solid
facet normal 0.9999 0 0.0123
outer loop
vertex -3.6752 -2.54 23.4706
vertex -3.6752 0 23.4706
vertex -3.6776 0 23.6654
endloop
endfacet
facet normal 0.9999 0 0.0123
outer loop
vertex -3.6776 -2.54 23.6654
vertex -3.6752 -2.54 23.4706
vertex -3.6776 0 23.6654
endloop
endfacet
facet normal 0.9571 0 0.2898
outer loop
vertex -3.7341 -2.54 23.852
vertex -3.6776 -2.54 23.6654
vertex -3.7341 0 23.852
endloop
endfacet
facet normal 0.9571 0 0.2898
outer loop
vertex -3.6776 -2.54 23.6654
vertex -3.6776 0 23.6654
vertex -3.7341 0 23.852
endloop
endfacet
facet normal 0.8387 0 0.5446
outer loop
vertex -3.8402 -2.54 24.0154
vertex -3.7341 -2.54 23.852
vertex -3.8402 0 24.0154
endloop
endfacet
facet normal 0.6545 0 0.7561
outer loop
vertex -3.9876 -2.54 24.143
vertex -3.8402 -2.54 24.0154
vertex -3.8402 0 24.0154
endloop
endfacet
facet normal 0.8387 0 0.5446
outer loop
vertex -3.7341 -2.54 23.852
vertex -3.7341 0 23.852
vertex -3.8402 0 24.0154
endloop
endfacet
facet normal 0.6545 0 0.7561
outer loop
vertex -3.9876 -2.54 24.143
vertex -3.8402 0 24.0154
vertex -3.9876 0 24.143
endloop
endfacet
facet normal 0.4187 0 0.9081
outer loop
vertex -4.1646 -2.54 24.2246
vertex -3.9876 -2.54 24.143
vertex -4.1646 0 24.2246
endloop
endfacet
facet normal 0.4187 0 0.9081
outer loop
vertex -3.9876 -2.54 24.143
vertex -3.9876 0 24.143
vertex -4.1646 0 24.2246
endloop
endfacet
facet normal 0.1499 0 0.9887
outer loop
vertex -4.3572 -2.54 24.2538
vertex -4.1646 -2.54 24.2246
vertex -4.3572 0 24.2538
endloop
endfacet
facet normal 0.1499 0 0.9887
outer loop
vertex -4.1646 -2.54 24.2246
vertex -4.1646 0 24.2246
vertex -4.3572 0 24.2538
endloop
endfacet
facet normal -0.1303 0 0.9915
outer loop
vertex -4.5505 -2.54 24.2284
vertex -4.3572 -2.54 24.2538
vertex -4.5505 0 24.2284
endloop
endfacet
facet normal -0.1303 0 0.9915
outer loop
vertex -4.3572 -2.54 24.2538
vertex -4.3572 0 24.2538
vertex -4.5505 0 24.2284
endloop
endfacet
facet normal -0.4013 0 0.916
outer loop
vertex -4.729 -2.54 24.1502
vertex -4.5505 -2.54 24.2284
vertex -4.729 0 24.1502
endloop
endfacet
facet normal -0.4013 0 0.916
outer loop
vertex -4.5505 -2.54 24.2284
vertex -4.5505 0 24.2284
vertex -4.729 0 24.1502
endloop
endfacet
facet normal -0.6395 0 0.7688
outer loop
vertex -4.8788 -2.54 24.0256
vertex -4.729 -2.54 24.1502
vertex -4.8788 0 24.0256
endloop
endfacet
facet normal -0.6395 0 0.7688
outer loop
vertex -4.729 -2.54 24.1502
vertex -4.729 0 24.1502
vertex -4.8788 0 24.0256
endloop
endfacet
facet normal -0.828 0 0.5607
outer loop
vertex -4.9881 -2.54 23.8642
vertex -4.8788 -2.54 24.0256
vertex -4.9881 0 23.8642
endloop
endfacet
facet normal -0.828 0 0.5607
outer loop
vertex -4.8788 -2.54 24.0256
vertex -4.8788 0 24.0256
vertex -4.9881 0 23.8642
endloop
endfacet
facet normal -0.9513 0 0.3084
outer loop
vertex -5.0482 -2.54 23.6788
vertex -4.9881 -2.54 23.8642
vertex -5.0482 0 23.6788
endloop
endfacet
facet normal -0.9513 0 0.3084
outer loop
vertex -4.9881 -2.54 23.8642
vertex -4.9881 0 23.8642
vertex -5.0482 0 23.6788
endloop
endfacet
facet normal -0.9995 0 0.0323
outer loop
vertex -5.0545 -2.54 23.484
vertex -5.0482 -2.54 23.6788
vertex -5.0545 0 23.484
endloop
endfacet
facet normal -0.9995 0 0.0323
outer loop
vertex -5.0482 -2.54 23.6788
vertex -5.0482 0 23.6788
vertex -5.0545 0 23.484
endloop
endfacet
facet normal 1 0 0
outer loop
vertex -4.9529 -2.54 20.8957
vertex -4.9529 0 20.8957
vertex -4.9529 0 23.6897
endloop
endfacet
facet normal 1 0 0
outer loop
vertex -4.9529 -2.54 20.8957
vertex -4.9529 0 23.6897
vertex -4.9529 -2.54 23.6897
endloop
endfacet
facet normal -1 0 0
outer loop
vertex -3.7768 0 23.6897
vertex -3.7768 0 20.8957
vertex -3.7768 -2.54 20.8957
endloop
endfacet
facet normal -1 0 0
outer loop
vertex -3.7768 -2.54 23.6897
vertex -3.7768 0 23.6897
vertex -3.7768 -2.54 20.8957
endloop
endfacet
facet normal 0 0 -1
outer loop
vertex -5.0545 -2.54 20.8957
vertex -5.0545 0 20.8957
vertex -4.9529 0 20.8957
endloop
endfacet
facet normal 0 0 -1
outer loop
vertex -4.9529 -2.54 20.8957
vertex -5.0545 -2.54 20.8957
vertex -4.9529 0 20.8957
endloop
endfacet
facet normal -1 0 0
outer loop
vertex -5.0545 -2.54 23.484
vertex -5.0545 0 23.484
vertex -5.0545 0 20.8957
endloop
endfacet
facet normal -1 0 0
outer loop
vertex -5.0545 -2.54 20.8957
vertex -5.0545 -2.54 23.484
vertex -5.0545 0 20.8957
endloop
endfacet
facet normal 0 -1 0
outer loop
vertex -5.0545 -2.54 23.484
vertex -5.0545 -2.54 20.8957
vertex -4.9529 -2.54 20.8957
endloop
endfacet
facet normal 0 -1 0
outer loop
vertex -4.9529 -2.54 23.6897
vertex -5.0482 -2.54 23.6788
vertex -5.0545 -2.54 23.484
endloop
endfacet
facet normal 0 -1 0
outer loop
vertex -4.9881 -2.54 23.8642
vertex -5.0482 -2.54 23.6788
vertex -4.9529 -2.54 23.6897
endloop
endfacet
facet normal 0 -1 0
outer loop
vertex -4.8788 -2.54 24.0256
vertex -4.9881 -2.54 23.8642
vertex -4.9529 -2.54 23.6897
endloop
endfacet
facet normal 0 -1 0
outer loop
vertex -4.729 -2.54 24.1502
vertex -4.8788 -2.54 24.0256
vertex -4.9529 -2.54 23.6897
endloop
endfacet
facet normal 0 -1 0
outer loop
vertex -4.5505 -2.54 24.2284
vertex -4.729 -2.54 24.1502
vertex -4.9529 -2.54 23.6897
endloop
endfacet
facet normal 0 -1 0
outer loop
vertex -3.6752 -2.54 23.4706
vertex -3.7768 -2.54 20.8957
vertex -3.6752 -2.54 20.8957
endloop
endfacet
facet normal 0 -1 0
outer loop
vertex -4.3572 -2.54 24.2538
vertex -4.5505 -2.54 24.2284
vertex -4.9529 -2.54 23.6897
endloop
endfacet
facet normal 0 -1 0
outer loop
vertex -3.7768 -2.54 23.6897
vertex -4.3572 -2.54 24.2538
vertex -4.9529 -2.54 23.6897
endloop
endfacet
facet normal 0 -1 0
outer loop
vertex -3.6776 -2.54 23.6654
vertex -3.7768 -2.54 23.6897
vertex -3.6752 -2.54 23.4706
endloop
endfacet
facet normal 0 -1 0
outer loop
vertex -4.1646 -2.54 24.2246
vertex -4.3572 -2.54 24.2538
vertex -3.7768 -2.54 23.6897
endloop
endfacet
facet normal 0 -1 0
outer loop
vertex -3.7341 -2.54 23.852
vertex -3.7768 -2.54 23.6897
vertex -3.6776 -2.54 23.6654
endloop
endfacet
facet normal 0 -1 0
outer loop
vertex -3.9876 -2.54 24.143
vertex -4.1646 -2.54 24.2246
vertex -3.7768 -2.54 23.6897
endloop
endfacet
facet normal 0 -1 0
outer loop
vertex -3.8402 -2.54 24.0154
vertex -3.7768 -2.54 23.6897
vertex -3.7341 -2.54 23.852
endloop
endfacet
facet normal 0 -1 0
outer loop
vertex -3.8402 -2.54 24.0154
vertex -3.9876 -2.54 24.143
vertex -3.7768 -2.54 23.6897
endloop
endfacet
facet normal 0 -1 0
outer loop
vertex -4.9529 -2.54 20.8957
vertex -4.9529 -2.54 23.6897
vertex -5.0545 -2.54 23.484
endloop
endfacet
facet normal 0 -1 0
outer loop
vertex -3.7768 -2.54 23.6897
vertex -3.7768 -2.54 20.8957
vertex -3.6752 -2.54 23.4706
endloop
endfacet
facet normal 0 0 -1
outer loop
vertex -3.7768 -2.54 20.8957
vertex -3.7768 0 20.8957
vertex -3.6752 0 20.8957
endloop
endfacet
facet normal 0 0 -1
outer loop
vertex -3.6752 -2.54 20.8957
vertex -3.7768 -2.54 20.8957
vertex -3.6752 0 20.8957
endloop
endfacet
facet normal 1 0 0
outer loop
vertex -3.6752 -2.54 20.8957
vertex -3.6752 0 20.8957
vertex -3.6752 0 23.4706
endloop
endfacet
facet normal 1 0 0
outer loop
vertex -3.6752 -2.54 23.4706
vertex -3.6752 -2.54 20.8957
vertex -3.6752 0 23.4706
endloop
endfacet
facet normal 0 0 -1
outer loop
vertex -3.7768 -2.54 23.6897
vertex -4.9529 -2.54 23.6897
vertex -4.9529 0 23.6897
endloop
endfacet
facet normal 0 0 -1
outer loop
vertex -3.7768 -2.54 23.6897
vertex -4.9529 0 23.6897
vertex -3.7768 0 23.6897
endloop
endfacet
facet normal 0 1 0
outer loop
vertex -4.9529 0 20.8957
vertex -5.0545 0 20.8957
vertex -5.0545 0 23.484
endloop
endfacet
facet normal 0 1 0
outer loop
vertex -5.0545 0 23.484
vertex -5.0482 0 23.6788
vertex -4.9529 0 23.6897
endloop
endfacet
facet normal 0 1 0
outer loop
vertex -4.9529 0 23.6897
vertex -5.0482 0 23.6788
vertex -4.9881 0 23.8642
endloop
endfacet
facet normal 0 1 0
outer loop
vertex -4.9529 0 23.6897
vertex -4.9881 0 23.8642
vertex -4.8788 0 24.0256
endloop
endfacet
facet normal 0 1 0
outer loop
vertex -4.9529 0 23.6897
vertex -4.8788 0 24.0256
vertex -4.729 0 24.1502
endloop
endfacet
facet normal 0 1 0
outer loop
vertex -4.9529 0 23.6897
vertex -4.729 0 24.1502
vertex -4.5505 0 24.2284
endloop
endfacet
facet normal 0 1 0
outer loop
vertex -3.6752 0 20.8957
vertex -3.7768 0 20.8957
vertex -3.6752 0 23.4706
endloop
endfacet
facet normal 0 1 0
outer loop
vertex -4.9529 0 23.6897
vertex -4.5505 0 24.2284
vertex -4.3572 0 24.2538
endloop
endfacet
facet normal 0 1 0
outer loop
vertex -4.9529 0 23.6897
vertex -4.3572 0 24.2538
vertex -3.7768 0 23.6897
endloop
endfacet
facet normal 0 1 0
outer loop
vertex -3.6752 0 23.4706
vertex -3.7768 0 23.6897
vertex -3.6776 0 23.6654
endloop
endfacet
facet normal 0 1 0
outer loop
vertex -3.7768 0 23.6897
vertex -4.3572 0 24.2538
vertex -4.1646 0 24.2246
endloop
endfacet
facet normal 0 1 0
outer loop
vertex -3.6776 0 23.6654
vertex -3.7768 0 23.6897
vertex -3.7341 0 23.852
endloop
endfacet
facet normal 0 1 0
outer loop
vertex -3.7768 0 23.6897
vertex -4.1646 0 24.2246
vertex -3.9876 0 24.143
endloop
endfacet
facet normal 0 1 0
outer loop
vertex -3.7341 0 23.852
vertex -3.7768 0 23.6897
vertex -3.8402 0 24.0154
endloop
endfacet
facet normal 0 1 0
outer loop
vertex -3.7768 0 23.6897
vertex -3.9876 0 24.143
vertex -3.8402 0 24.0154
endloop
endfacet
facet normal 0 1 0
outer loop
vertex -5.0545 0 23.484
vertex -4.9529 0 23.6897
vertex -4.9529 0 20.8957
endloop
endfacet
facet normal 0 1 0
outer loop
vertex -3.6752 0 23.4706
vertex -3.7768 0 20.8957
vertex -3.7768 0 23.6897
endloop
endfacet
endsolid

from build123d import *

# Parameters (mm, degrees)
F1_DEPTH = 2.54
F2_W     = 1.176077
F2_H     = 2.54
F3_DEPTH = 2.794


with BuildPart() as f1:
    # F0 (on Front) → F1 (new body)
    with BuildSketch(Plane.XZ):
        with BuildLine():
            Line((-3.675181, 20.895714), (-3.675181, 23.470577))
            ThreePointArc((-3.675181, 23.470577), (-4.357243, 24.25382), (-5.054458, 23.484033))
            Line((-5.054458, 23.484033), (-5.054458, 20.895714))
            Line((-5.054458, 20.895714), (-3.675181, 20.895714))
        make_face()
    extrude(amount=F1_DEPTH)

    # F2 (on face) → F3 (cut)
    with BuildSketch(Plane(origin=(0, 0, 20.895714), x_dir=(1, 0, 0), z_dir=(0, 0, -1))):
        with Locations((-4.364819, 1.27)):
            Rectangle(F2_W, F2_H)
    extrude(amount=-F3_DEPTH, mode=Mode.SUBTRACT)


solid = f1.part
